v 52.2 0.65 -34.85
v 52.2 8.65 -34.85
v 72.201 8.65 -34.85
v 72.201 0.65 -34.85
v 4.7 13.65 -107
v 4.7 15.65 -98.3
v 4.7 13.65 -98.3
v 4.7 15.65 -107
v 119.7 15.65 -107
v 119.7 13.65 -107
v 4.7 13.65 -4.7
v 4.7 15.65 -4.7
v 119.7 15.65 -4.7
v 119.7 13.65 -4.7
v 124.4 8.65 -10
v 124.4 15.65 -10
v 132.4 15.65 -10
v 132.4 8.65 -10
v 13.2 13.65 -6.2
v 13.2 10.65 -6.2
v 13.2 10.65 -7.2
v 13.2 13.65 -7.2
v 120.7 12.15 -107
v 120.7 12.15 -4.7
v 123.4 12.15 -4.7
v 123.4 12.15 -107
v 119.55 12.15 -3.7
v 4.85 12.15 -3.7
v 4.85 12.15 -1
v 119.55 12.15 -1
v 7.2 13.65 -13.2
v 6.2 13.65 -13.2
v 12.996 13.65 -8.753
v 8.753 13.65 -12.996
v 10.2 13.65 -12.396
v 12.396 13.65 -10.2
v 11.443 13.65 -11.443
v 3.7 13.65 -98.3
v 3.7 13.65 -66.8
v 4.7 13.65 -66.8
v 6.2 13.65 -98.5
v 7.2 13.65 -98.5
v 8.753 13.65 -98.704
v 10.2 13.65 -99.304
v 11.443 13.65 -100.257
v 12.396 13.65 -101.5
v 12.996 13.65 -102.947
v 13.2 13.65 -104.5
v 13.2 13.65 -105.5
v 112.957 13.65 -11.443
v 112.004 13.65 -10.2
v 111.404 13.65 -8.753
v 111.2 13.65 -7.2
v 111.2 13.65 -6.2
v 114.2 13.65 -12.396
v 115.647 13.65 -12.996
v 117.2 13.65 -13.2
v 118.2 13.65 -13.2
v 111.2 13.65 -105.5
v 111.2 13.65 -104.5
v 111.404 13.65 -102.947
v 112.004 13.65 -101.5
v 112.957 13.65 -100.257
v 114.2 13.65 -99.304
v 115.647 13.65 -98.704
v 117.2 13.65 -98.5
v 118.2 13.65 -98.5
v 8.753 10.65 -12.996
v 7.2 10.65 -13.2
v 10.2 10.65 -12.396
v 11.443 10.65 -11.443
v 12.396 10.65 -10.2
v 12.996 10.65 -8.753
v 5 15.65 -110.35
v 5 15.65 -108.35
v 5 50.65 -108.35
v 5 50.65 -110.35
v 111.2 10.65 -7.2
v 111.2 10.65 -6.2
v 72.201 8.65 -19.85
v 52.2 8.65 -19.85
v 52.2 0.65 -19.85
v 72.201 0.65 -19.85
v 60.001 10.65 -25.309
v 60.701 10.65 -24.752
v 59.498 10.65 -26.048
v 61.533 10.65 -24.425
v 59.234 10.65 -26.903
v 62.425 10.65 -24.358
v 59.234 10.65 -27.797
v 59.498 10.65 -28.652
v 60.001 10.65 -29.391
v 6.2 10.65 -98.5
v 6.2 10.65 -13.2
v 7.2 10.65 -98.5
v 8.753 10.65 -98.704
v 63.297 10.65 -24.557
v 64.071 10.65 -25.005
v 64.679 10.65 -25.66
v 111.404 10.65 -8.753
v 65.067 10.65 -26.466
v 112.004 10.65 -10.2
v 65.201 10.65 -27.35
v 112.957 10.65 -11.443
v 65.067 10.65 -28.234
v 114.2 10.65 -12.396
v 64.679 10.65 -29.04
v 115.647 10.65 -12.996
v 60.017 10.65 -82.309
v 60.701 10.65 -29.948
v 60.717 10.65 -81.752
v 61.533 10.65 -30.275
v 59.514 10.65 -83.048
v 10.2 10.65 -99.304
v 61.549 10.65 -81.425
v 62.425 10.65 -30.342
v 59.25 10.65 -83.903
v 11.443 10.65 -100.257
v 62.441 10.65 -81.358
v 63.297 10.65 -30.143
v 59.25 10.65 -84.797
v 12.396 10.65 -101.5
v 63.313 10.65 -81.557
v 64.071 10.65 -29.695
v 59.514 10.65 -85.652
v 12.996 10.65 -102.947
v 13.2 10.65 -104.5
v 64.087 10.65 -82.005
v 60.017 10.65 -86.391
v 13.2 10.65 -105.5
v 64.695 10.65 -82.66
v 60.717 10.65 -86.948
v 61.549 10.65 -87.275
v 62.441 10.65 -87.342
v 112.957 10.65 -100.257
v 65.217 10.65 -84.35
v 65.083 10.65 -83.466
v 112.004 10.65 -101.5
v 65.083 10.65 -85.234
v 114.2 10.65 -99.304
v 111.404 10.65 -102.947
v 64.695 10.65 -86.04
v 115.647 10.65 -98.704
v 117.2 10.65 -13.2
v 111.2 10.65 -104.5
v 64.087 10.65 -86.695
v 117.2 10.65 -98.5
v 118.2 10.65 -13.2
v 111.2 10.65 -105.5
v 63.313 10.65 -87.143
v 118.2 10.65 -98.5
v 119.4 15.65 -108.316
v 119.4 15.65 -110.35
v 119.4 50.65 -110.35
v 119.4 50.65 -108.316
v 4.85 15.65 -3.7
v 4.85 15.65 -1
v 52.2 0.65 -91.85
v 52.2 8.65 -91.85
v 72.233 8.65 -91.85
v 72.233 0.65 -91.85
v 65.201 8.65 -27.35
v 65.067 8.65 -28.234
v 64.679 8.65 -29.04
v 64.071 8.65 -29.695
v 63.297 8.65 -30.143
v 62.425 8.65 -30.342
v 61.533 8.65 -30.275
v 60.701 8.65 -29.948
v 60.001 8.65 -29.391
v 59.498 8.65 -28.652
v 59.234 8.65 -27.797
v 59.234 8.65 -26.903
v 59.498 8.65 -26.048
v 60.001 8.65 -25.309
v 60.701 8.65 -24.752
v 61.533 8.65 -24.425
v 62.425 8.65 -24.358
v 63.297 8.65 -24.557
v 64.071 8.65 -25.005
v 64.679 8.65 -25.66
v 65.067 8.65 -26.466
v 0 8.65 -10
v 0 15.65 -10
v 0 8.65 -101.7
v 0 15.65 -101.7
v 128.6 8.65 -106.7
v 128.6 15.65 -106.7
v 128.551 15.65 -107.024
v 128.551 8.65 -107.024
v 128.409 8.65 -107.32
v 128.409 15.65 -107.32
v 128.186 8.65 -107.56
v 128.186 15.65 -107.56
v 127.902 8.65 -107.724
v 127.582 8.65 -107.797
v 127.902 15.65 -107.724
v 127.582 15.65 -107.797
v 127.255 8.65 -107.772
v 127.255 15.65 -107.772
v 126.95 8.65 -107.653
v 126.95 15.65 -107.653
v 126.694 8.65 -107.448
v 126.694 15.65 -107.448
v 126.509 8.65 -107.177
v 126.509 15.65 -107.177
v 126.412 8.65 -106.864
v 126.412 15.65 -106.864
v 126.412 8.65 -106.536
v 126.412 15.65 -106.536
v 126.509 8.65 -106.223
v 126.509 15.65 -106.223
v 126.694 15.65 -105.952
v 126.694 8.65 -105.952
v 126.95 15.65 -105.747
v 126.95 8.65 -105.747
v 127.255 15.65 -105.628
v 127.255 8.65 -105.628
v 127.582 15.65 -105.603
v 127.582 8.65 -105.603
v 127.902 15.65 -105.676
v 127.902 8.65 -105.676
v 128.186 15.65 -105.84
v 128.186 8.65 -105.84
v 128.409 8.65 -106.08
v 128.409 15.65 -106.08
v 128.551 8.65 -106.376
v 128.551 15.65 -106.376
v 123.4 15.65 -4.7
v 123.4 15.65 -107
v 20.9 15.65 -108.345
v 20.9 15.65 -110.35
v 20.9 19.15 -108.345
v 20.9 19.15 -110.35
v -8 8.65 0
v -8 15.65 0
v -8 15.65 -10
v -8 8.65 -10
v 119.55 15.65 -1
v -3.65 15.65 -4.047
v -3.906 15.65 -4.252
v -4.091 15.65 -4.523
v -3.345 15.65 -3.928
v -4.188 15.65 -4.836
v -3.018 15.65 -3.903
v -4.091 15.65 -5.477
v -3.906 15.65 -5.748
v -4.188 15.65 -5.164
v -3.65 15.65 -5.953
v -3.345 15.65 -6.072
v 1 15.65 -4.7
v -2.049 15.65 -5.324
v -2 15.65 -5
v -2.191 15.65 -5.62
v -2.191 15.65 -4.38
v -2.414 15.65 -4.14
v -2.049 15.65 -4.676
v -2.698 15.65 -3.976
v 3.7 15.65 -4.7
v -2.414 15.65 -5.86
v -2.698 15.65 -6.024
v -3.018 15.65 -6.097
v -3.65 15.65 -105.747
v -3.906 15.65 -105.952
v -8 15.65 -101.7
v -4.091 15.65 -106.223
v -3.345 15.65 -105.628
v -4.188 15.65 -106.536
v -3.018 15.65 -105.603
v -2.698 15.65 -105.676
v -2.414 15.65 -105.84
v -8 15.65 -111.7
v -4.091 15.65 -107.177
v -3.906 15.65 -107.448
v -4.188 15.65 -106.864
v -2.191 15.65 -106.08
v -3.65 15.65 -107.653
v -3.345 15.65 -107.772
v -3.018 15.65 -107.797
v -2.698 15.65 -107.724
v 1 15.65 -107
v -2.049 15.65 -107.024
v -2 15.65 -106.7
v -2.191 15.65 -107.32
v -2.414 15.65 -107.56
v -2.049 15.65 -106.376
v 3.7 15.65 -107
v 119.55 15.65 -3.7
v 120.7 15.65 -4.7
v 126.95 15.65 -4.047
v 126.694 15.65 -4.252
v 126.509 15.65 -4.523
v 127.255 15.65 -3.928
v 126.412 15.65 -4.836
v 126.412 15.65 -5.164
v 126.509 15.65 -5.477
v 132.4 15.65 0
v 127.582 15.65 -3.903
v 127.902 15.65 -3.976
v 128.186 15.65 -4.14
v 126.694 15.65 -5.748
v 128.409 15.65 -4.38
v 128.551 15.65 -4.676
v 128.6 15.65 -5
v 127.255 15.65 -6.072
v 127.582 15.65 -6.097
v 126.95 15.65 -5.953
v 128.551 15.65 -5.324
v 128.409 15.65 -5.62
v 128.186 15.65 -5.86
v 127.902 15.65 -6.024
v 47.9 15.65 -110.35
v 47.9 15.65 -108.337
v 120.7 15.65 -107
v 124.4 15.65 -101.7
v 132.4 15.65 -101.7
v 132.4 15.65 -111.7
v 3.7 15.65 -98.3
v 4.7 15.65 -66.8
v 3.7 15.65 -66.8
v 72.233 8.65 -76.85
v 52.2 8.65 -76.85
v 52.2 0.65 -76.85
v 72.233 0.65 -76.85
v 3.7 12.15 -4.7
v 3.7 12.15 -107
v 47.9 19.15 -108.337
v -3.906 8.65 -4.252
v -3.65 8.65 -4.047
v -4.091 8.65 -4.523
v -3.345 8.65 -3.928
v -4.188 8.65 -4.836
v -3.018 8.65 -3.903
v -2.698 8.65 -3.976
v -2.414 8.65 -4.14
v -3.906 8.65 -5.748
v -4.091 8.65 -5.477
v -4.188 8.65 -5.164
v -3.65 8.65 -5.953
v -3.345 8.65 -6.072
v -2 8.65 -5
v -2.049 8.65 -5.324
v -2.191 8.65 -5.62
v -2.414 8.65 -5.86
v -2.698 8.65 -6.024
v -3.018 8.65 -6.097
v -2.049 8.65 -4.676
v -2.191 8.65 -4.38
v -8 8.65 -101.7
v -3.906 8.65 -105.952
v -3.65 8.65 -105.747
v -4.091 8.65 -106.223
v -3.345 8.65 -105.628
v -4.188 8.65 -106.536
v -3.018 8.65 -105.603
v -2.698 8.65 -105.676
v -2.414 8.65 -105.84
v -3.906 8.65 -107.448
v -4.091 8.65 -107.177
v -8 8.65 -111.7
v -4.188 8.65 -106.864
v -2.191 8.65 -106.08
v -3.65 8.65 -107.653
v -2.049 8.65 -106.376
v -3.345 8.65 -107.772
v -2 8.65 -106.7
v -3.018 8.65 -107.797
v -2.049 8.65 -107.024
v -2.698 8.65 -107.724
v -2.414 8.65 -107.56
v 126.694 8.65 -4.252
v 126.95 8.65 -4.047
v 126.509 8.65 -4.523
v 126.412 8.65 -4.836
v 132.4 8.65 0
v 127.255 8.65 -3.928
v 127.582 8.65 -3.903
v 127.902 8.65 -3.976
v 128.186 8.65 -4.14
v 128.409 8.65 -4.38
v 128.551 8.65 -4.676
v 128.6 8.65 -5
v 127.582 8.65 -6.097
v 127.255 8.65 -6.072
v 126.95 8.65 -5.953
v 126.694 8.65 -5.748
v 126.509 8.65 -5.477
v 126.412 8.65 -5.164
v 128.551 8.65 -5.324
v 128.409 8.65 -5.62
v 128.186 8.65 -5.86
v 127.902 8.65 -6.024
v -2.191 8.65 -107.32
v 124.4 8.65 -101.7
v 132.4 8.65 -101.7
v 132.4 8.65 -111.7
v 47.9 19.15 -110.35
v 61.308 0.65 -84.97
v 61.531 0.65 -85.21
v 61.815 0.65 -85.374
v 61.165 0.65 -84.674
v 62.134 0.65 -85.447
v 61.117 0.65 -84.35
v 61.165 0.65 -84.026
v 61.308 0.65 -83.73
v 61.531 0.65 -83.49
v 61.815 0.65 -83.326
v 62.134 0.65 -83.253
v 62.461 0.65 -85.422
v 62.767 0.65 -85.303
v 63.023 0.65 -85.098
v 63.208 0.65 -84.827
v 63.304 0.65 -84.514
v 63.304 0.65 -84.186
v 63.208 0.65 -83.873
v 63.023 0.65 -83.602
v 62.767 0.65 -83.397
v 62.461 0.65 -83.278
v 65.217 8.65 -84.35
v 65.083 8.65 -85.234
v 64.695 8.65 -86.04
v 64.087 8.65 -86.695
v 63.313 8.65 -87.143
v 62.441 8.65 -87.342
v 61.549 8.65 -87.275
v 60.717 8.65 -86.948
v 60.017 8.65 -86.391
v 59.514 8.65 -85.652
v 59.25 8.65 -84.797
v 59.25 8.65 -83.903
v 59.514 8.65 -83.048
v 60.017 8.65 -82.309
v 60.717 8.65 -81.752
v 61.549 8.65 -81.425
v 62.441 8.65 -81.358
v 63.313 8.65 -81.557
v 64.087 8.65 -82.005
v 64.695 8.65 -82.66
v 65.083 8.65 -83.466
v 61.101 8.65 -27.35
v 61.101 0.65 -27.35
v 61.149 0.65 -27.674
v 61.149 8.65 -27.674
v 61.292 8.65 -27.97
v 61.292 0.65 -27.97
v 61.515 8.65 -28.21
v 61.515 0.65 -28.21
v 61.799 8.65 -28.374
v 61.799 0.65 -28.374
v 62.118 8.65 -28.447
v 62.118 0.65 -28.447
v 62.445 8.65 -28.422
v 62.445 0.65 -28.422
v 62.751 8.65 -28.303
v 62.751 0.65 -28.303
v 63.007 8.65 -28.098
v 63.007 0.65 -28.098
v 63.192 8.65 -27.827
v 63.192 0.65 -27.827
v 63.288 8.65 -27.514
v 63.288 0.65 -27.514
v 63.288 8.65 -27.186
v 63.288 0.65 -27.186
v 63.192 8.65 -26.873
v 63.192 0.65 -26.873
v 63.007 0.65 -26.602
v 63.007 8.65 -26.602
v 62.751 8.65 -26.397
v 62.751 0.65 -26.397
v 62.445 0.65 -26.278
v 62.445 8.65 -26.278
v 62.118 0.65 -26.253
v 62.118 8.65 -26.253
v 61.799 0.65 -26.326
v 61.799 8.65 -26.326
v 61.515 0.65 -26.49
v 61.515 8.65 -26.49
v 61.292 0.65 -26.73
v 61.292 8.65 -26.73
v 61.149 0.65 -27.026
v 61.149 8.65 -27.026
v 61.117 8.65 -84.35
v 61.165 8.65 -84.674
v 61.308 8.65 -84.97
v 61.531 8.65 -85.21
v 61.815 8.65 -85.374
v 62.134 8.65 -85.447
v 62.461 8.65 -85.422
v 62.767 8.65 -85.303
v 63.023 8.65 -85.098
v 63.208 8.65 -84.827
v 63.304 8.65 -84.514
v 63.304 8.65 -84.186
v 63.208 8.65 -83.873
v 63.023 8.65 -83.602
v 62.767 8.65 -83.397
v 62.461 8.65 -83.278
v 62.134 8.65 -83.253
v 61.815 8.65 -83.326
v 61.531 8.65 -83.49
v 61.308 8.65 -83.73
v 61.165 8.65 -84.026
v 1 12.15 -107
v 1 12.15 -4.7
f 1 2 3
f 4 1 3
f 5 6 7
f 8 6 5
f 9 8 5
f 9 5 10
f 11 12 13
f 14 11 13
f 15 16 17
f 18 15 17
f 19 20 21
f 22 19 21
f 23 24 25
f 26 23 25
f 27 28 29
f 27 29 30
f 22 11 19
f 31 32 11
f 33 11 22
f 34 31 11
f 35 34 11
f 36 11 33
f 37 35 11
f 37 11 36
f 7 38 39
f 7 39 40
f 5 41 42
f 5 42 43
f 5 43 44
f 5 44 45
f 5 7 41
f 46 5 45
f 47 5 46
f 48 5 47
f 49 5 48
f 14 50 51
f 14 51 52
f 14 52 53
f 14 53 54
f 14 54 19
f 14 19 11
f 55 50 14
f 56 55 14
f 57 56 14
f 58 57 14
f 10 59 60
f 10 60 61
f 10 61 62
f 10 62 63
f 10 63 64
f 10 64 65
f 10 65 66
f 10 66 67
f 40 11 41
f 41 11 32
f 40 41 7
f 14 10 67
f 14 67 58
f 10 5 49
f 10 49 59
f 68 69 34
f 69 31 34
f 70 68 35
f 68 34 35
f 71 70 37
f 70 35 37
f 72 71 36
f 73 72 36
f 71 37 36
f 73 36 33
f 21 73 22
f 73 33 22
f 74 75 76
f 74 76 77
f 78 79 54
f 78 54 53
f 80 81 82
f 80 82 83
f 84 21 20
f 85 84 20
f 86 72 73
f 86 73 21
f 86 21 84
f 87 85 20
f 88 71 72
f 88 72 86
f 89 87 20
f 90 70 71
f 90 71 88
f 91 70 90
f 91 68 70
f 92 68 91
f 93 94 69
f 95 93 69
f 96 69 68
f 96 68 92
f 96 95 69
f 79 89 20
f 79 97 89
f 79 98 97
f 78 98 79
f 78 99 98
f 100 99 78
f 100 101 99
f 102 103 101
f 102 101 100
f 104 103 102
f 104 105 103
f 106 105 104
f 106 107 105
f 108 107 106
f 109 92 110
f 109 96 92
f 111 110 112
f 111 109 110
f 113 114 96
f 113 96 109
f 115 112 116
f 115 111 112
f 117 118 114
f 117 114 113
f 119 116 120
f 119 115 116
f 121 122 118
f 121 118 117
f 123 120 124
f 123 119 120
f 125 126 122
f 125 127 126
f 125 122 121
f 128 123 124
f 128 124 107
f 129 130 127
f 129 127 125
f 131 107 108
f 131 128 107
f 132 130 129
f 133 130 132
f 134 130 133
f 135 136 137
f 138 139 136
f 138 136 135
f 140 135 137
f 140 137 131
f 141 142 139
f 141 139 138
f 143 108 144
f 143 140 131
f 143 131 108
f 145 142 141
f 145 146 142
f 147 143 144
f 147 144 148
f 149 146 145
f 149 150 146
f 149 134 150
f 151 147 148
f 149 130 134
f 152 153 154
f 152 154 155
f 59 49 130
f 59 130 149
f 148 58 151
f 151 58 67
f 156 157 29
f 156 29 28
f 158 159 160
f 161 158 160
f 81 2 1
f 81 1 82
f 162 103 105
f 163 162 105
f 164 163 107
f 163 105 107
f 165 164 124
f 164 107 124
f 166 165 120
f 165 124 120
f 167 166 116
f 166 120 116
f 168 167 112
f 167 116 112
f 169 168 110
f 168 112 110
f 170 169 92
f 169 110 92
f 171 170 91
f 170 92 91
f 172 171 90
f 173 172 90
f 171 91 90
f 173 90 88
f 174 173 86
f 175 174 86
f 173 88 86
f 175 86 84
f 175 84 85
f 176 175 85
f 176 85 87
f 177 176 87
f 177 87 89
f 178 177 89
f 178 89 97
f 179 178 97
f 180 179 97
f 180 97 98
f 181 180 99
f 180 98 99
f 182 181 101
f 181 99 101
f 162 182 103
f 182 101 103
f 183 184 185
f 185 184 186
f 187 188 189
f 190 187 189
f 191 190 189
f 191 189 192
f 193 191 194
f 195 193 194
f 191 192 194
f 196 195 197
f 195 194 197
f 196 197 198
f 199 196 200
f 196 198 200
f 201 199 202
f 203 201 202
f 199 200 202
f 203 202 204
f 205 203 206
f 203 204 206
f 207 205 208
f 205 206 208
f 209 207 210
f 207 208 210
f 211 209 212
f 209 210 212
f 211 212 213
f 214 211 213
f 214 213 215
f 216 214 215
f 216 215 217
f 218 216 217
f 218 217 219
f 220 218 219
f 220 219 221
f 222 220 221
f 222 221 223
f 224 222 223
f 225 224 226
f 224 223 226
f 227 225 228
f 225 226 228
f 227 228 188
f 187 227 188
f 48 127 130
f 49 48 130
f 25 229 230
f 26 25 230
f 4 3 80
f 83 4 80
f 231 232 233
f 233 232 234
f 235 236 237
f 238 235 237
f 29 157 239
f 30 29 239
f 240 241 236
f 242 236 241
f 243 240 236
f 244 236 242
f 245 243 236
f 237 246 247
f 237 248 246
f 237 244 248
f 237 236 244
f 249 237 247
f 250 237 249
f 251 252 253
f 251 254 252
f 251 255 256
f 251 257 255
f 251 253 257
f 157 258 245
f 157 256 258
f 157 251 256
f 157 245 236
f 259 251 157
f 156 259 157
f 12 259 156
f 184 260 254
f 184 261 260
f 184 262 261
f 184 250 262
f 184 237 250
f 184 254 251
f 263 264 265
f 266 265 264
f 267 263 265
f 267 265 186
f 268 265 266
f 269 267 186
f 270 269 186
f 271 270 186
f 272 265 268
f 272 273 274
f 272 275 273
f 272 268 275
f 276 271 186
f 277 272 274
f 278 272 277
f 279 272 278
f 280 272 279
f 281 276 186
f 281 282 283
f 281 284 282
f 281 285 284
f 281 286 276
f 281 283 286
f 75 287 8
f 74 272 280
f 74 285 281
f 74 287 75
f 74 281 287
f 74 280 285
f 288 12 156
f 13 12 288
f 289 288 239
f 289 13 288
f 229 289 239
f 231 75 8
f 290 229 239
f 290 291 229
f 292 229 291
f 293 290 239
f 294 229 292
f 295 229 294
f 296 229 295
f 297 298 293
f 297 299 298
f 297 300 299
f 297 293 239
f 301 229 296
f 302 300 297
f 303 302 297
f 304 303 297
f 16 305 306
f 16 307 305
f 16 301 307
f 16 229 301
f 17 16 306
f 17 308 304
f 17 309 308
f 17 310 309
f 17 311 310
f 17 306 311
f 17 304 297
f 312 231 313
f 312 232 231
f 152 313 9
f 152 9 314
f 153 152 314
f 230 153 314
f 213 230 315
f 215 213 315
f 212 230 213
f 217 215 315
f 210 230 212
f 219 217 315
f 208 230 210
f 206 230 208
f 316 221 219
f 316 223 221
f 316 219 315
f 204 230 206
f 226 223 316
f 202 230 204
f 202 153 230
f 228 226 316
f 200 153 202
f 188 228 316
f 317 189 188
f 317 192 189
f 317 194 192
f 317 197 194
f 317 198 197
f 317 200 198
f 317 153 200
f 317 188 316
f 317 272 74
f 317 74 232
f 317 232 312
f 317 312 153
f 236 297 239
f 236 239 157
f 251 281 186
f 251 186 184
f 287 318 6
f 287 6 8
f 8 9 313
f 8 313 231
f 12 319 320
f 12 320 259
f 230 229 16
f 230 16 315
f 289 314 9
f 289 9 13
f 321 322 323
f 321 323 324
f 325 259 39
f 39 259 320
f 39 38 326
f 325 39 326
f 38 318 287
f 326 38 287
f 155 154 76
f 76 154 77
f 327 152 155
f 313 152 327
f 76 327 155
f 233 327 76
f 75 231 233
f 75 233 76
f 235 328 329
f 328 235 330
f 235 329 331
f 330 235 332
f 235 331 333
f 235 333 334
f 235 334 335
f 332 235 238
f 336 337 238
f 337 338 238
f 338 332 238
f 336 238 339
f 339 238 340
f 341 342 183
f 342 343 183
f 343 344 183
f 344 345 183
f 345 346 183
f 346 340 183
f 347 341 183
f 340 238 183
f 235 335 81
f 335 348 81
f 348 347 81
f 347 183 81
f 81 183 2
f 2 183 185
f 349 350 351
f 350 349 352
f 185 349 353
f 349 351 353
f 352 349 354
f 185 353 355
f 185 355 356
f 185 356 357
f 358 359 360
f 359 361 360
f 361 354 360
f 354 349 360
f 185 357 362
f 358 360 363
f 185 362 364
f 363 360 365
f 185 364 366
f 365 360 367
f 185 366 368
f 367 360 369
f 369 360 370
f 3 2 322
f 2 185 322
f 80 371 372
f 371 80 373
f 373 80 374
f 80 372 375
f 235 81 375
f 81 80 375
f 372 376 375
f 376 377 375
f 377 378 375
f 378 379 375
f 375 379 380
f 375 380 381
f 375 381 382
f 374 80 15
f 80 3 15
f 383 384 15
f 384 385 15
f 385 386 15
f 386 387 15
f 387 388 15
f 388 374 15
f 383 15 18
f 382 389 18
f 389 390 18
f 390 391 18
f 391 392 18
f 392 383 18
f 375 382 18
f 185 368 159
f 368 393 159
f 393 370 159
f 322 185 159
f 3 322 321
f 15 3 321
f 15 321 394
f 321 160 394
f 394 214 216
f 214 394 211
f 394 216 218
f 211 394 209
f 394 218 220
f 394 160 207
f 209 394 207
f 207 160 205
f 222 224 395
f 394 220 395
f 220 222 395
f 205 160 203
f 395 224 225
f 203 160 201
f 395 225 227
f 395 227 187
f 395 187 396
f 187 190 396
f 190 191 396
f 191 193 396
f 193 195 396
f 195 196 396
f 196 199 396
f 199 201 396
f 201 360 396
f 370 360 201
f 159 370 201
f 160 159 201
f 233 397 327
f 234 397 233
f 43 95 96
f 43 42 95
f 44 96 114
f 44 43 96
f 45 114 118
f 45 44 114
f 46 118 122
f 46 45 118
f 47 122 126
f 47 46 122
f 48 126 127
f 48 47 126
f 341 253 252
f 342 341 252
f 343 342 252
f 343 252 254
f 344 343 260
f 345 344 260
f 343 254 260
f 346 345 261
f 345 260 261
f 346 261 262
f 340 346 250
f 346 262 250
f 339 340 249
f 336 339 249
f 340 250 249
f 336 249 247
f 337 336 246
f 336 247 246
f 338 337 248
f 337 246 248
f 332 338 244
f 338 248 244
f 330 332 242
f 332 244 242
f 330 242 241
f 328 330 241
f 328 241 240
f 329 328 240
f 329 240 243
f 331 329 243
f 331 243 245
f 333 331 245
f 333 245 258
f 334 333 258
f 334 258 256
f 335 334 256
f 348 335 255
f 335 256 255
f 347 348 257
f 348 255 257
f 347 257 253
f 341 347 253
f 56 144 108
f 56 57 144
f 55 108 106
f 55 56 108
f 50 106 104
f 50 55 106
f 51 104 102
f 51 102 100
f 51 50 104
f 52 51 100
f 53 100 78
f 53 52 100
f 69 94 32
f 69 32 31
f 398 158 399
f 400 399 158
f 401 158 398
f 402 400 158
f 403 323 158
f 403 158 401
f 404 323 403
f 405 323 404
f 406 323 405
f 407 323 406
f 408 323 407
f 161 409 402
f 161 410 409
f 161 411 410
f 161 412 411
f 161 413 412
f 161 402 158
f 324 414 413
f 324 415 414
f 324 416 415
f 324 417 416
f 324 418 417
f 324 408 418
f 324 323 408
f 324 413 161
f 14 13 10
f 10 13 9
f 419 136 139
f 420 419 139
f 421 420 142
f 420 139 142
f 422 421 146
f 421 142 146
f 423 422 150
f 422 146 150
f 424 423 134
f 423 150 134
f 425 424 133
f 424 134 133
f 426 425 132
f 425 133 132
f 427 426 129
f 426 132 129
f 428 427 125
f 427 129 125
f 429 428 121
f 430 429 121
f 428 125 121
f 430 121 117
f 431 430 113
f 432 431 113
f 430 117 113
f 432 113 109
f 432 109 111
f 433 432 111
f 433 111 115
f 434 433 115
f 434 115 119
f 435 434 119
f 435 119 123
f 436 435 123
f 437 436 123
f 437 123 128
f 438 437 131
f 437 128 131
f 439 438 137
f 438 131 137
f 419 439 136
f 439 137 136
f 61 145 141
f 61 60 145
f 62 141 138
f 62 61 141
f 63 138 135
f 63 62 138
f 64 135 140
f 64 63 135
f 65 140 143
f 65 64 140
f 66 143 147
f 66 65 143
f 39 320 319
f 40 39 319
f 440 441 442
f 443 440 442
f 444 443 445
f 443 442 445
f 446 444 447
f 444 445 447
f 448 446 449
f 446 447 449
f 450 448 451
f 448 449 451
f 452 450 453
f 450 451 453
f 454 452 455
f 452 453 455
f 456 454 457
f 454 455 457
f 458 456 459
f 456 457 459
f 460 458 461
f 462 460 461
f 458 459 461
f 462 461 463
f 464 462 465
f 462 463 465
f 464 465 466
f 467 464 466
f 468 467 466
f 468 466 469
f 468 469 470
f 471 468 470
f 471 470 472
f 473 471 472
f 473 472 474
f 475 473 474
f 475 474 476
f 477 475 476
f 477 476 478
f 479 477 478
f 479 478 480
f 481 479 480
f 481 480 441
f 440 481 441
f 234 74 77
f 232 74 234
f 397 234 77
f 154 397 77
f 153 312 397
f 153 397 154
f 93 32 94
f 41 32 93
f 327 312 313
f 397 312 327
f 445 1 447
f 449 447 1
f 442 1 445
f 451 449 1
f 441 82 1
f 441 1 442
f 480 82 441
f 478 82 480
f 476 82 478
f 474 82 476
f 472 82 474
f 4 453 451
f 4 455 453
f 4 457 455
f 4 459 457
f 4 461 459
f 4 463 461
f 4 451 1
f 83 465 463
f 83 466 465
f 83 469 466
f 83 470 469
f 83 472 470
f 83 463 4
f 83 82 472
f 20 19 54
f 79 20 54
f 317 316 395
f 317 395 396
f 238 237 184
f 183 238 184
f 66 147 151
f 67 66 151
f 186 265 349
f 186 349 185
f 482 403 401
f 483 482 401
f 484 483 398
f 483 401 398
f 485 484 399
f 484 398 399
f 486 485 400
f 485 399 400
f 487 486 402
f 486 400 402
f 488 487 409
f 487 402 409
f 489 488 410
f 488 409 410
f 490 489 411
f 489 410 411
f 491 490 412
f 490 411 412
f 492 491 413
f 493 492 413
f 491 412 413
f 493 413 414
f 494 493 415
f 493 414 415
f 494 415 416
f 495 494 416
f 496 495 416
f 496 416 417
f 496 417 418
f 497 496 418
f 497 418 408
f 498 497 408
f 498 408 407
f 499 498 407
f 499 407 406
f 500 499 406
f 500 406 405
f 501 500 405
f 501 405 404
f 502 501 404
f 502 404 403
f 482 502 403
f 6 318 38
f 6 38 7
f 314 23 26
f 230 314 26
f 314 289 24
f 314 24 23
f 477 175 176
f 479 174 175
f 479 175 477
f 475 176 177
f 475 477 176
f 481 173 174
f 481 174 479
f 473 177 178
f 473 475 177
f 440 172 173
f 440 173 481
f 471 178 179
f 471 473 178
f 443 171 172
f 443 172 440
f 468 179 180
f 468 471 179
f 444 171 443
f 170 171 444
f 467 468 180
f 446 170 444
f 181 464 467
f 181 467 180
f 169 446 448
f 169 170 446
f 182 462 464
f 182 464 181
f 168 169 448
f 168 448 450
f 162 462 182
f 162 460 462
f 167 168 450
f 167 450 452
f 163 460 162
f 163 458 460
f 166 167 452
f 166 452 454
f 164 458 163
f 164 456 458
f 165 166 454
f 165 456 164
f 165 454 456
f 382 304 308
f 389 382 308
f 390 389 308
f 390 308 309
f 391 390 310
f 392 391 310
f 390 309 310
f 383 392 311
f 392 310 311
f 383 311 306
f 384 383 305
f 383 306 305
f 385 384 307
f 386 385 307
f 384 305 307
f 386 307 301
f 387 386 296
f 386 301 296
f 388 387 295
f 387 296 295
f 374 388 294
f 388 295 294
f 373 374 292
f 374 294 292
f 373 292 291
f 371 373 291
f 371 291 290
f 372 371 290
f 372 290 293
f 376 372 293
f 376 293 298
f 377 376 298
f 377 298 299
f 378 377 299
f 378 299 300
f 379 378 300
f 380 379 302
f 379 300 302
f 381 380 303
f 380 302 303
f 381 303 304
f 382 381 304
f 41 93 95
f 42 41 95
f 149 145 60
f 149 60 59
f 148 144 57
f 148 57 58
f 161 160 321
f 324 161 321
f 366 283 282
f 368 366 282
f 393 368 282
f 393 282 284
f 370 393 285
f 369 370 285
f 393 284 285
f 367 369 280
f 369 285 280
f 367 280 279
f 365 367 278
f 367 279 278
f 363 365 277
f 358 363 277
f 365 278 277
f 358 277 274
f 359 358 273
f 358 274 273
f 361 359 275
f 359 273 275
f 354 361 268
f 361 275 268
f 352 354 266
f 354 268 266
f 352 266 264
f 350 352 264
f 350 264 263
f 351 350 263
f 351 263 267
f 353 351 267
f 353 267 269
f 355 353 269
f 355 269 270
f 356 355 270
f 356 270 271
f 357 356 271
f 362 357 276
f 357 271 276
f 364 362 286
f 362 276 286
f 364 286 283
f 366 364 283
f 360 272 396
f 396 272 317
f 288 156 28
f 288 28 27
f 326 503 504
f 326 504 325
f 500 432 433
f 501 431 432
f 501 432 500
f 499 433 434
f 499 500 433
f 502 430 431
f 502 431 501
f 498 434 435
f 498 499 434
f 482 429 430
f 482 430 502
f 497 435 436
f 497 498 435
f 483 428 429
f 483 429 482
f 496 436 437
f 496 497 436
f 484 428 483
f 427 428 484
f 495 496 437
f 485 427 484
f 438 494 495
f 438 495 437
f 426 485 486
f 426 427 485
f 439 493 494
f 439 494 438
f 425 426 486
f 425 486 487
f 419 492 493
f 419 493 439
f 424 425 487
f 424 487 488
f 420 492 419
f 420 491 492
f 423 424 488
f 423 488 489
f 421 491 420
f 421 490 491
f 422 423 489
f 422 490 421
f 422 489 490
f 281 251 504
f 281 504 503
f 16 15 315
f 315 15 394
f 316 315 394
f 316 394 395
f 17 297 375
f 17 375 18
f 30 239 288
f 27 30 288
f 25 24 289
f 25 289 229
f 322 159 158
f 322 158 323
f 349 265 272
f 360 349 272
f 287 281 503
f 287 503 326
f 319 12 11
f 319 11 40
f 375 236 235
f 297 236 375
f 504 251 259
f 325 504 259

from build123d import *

# Parameters (mm, degrees)
SKETCH1_W            = 124.4
SKETCH1_H            = 111.7
BOSS_EXTRUDE1_DEPTH  = 15.65
FILLET1_R            = 2
SKETCH4_W            = 115
SKETCH4_H            = 102.3
CUT_EXTRUDE1_DEPTH   = 2
SKETCH5_W            = 112
SKETCH5_H            = 99.3
CUT_EXTRUDE2_DEPTH   = 3
SKETCH10_W           = 7
SKETCH10_H           = 7
BOSS_EXTRUDE2_DEPTH  = 3
BOSS_EXTRUDE5_DEPTH  = 35
FILLET3_R            = 6
SKETCH32_W           = 114.7
SKETCH32_H           = 2.7
SKETCH32_W_2         = 2.7
SKETCH32_H_2         = 102.3
CUT_EXTRUDE7_DEPTH   = 3.5
SKETCH29_W           = 27
SKETCH29_H           = 3.5
CUT_EXTRUDE8_DEPTH   = 112.7
SKETCH34_W           = 1
SKETCH34_H           = 31.5
CUT_EXTRUDE9_DEPTH   = 2
SKETCH39_W           = 124.4
SKETCH39_H           = 111.7
CUT_EXTRUDE14_DEPTH  = 8.65
SKETCH40_W           = 10.736913624
SKETCH40_H           = 4.7
BOSS_EXTRUDE8_DEPTH  = 7
SKETCH42_W           = 6.036913624
SKETCH42_H           = 2.116828075
BOSS_EXTRUDE9_DEPTH  = 7
SKETCH43_W           = 2
SKETCH43_H           = 3.979386742
BOSS_EXTRUDE10_DEPTH = 7
SKETCH44_W           = 10.013933806
SKETCH44_H           = 10.028001726
BOSS_EXTRUDE11_DEPTH = 7
SKETCH45_R           = 1.1
CUT_EXTRUDE15_DEPTH  = 8
SKETCH46_W           = 2
SKETCH46_H           = 2
BOSS_EXTRUDE12_DEPTH = 7
SKETCH47_W           = 2
SKETCH47_H           = 2
BOSS_EXTRUDE13_DEPTH = 7
SKETCH48_W           = 10
SKETCH48_H           = 10
BOSS_EXTRUDE14_DEPTH = 7
SKETCH49_R           = 1.1
SKETCH49_W           = 6.036913624
SKETCH49_H           = 6.816828075
CUT_EXTRUDE18_DEPTH  = 7
SKETCH50_W           = 8
SKETCH50_H           = 10
BOSS_EXTRUDE17_DEPTH = 7
SKETCH51_W           = 5.24842793
SKETCH51_H           = 4.514776714
BOSS_EXTRUDE18_DEPTH = 7
SKETCH52_W           = 2
SKETCH52_H           = 10
CUT_EXTRUDE19_DEPTH  = 7
SKETCH53_W           = 10.013933806
SKETCH53_H           = 10.028001726
CUT_EXTRUDE20_DEPTH  = 7
SKETCH54_W           = 8
SKETCH54_H           = 10
BOSS_EXTRUDE19_DEPTH = 7
SKETCH55_W           = 8
SKETCH55_H           = 10
BOSS_EXTRUDE20_DEPTH = 7
SKETCH56_R           = 1.1
CUT_EXTRUDE21_DEPTH  = 7
SKETCH57_R           = 1.1
CUT_EXTRUDE22_DEPTH  = 7
SKETCH58_R           = 1.1
CUT_EXTRUDE23_DEPTH  = 7
SKETCH59_R           = 1.1
CUT_EXTRUDE24_DEPTH  = 7
SKETCH61_W           = 20.033048375
SKETCH61_H           = 15
SKETCH61_W_2         = 20.00121795
BOSS_EXTRUDE22_DEPTH = 8
SKETCH64_R           = 1.1
CUT_EXTRUDE27_DEPTH  = 51
SKETCH65_R           = 3
CUT_EXTRUDE28_DEPTH  = 2


with BuildPart() as part:
    # Sketch1 → Boss-Extrude1 (new body)
    with BuildSketch(Plane(origin=(0, 0, 0), x_dir=(1, 0, 0), z_dir=(0, 1, 0))):
        with Locations((62.2, 55.85)):
            Rectangle(SKETCH1_W, SKETCH1_H)
    extrude(amount=BOSS_EXTRUDE1_DEPTH)

    # Fillet1
    fillet1_edges = [part.edges().sort_by_distance(p)[0] for p in [
        (0, 7.825, -111.7),
        (124.4, 7.825, -111.7),
        (124.4, 7.825, 0),
        (0, 7.825, 0),
    ]]
    fillet(fillet1_edges, radius=FILLET1_R)

    # Sketch4 → Cut-Extrude1 (cut)
    with BuildSketch(Plane(origin=(0, 15.65, 0), x_dir=(1, 0, 0), z_dir=(0, 1, 0))):
        with Locations((62.2, 55.85)):
            Rectangle(SKETCH4_W, SKETCH4_H)
    extrude(amount=-CUT_EXTRUDE1_DEPTH, mode=Mode.SUBTRACT)

    # Sketch5 → Cut-Extrude2 (cut)
    with BuildSketch(Plane(origin=(0, 13.65, 0), x_dir=(1, 0, 0), z_dir=(0, 1, 0))):
        with Locations((62.2, 55.85)):
            Rectangle(SKETCH5_W, SKETCH5_H)
    extrude(amount=-CUT_EXTRUDE2_DEPTH, mode=Mode.SUBTRACT)

    # Sketch10 → Boss-Extrude2 (add)
    with BuildSketch(Plane(origin=(0, 10.65, 0), x_dir=(1, 0, 0), z_dir=(0, 1, 0))):
        with Locations((9.7, 102)):
            Rectangle(SKETCH10_W, SKETCH10_H)
        with Locations((9.7, 9.7)):
            Rectangle(SKETCH10_W, SKETCH10_H)
        with Locations((114.7, 102)):
            Rectangle(SKETCH10_W, SKETCH10_H)
        with Locations((114.7, 9.7)):
            Rectangle(SKETCH10_W, SKETCH10_H)
    extrude(amount=BOSS_EXTRUDE2_DEPTH)

    # Sketch27 → Boss-Extrude5 (add)
    with BuildSketch(Plane(origin=(0, 15.65, 0), x_dir=(1, 0, 0), z_dir=(0, 1, 0))):
        Polygon((5, 110.35), (119.4, 110.35), (119.4, 108.316244658), (5, 108.35), align=None)
    extrude(amount=BOSS_EXTRUDE5_DEPTH)

    # Fillet3
    fillet3_edges = [part.edges().sort_by_distance(p)[0] for p in [
        (111.2, 12.15, -13.2),
        (13.2, 12.15, -98.5),
        (13.2, 12.15, -13.2),
        (111.2, 12.15, -98.5),
    ]]
    fillet(fillet3_edges, radius=FILLET3_R)

    # Sketch32 → Cut-Extrude7 (cut)
    with BuildSketch(Plane(origin=(0, 15.65, 0), x_dir=(1, 0, 0), z_dir=(0, 1, 0))):
        with Locations((62.2, 2.35)):
            Rectangle(SKETCH32_W, SKETCH32_H)
        with Locations((2.35, 55.85)):
            Rectangle(SKETCH32_W_2, SKETCH32_H_2)
        with Locations((122.05, 55.85)):
            Rectangle(SKETCH32_W_2, SKETCH32_H_2)
    extrude(amount=-CUT_EXTRUDE7_DEPTH, mode=Mode.SUBTRACT)

    # Sketch29 → Cut-Extrude8 (cut, through all)
    with BuildSketch(Plane(origin=(0, 0, -111.7), x_dir=(-1, 0, 0), z_dir=(0, 0, -1))):
        with Locations((-34.4, 17.4)):
            Rectangle(SKETCH29_W, SKETCH29_H)
    extrude(amount=-CUT_EXTRUDE8_DEPTH, mode=Mode.SUBTRACT)

    # Sketch34 → Cut-Extrude9 (cut)
    with BuildSketch(Plane(origin=(0, 15.65, 0), x_dir=(1, 0, 0), z_dir=(0, 1, 0))):
        with Locations((4.2, 82.55)):
            Rectangle(SKETCH34_W, SKETCH34_H)
    extrude(amount=-CUT_EXTRUDE9_DEPTH, mode=Mode.SUBTRACT)

    # Sketch39 → Cut-Extrude14 (cut)
    with BuildSketch(Plane(origin=(0, 0, 0), x_dir=(-1, 0, 0), z_dir=(0, -1, 0))):
        with Locations((-62.2, 55.85)):
            Rectangle(SKETCH39_W, SKETCH39_H)
    extrude(amount=-CUT_EXTRUDE14_DEPTH, mode=Mode.SUBTRACT)

    # Sketch40 → Boss-Extrude8 (add)
    with BuildSketch(Plane(origin=(0, 15.65, 0), x_dir=(1, 0, 0), z_dir=(0, 1, 0))):
        with Locations((-0.668456812, 2.35)):
            Rectangle(SKETCH40_W, SKETCH40_H)
    extrude(amount=-BOSS_EXTRUDE8_DEPTH)

    # Sketch42 → Boss-Extrude9 (add)
    with BuildSketch(Plane(origin=(0, 15.65, 0), x_dir=(1, 0, 0), z_dir=(0, 1, 0))):
        with Locations((-3.018456812, 5.758414037)):
            Rectangle(SKETCH42_W, SKETCH42_H)
    extrude(amount=-BOSS_EXTRUDE9_DEPTH)

    # Sketch43 → Boss-Extrude10 (add)
    with BuildSketch(Plane(origin=(0, 15.65, 0), x_dir=(1, 0, 0), z_dir=(0, 1, 0))):
        with Locations((123.4, 1.989693371)):
            Rectangle(SKETCH43_W, SKETCH43_H)
    extrude(amount=-BOSS_EXTRUDE10_DEPTH)

    # Sketch44 → Boss-Extrude11 (add)
    with BuildSketch(Plane(origin=(0, 15.65, 0), x_dir=(1, 0, 0), z_dir=(0, 1, 0))):
        with Locations((129.406966903, 5.014000863)):
            Rectangle(SKETCH44_W, SKETCH44_H)
    extrude(amount=-BOSS_EXTRUDE11_DEPTH)

    # Sketch45 → Cut-Extrude15 (cut, through all)
    with BuildSketch(Plane(origin=(0, 15.65, 0), x_dir=(1, 0, 0), z_dir=(0, 1, 0))):
        with Locations((129.4, 5)):
            Circle(SKETCH45_R)
    extrude(amount=-CUT_EXTRUDE15_DEPTH, mode=Mode.SUBTRACT)

    # Sketch46 → Boss-Extrude12 (add)
    with BuildSketch(Plane(origin=(0, 15.65, 0), x_dir=(1, 0, 0), z_dir=(0, 1, 0))):
        with Locations((123.4, 110.7)):
            Rectangle(SKETCH46_W, SKETCH46_H)
    extrude(amount=-BOSS_EXTRUDE12_DEPTH)

    # Sketch47 → Boss-Extrude13 (add)
    with BuildSketch(Plane(origin=(0, 15.65, 0), x_dir=(1, 0, 0), z_dir=(0, 1, 0))):
        with Locations((1, 110.7)):
            Rectangle(SKETCH47_W, SKETCH47_H)
    extrude(amount=-BOSS_EXTRUDE13_DEPTH)

    # Sketch48 → Boss-Extrude14 (add)
    with BuildSketch(Plane(origin=(0, 15.65, 0), x_dir=(1, 0, 0), z_dir=(0, 1, 0))):
        with Locations((-5, 106.7)):
            Rectangle(SKETCH48_W, SKETCH48_H)
    extrude(amount=-BOSS_EXTRUDE14_DEPTH)

    # Sketch49 → Cut-Extrude18 (cut)
    with BuildSketch(Plane(origin=(0, 15.65, 0), x_dir=(1, 0, 0), z_dir=(0, 1, 0))):
        with Locations((-5, 106.7)):
            Circle(SKETCH49_R)
        with Locations((-3.018456812, 3.408414038)):
            Rectangle(SKETCH49_W, SKETCH49_H)
    extrude(amount=-CUT_EXTRUDE18_DEPTH, mode=Mode.SUBTRACT)

    # Sketch50 → Boss-Extrude17 (add)
    with BuildSketch(Plane(origin=(0, 15.65, 0), x_dir=(1, 0, 0), z_dir=(0, 1, 0))):
        with Locations((-4, 5)):
            Rectangle(SKETCH50_W, SKETCH50_H)
    extrude(amount=-BOSS_EXTRUDE17_DEPTH)

    # Sketch51 → Boss-Extrude18 (add)
    with BuildSketch(Plane(origin=(0, 15.65, 0), x_dir=(1, 0, 0), z_dir=(0, 1, 0))):
        with Locations((-4.818404413, 107.053945145)):
            Rectangle(SKETCH51_W, SKETCH51_H)
    extrude(amount=-BOSS_EXTRUDE18_DEPTH)

    # Sketch52 → Cut-Extrude19 (cut)
    with BuildSketch(Plane(origin=(0, 15.65, 0), x_dir=(1, 0, 0), z_dir=(0, 1, 0))):
        with Locations((-9, 106.7)):
            Rectangle(SKETCH52_W, SKETCH52_H)
    extrude(amount=-CUT_EXTRUDE19_DEPTH, mode=Mode.SUBTRACT)

    # Sketch53 → Cut-Extrude20 (cut)
    with BuildSketch(Plane(origin=(0, 15.65, 0), x_dir=(1, 0, 0), z_dir=(0, 1, 0))):
        with Locations((129.406966903, 5.014000863)):
            Rectangle(SKETCH53_W, SKETCH53_H)
    extrude(amount=-CUT_EXTRUDE20_DEPTH, mode=Mode.SUBTRACT)

    # Sketch54 → Boss-Extrude19 (add)
    with BuildSketch(Plane(origin=(0, 15.65, 0), x_dir=(1, 0, 0), z_dir=(0, 1, 0))):
        with Locations((128.4, 5)):
            Rectangle(SKETCH54_W, SKETCH54_H)
    extrude(amount=-BOSS_EXTRUDE19_DEPTH)

    # Sketch55 → Boss-Extrude20 (add)
    with BuildSketch(Plane(origin=(0, 15.65, 0), x_dir=(1, 0, 0), z_dir=(0, 1, 0))):
        with Locations((128.4, 106.7)):
            Rectangle(SKETCH55_W, SKETCH55_H)
    extrude(amount=-BOSS_EXTRUDE20_DEPTH)

    # Sketch56 → Cut-Extrude21 (cut)
    with BuildSketch(Plane(origin=(0, 15.65, 0), x_dir=(1, 0, 0), z_dir=(0, 1, 0))):
        with Locations((-3.1, 106.7)):
            Circle(SKETCH56_R)
    extrude(amount=-CUT_EXTRUDE21_DEPTH, mode=Mode.SUBTRACT)

    # Sketch57 → Cut-Extrude22 (cut)
    with BuildSketch(Plane(origin=(0, 15.65, 0), x_dir=(1, 0, 0), z_dir=(0, 1, 0))):
        with Locations((-3.1, 5)):
            Circle(SKETCH57_R)
    extrude(amount=-CUT_EXTRUDE22_DEPTH, mode=Mode.SUBTRACT)

    # Sketch58 → Cut-Extrude23 (cut)
    with BuildSketch(Plane(origin=(0, 15.65, 0), x_dir=(1, 0, 0), z_dir=(0, 1, 0))):
        with Locations((127.5, 5)):
            Circle(SKETCH58_R)
    extrude(amount=-CUT_EXTRUDE23_DEPTH, mode=Mode.SUBTRACT)

    # Sketch59 → Cut-Extrude24 (cut)
    with BuildSketch(Plane(origin=(0, 15.65, 0), x_dir=(1, 0, 0), z_dir=(0, 1, 0))):
        with Locations((127.5, 106.7)):
            Circle(SKETCH59_R)
    extrude(amount=-CUT_EXTRUDE24_DEPTH, mode=Mode.SUBTRACT)

    # Sketch61 → Boss-Extrude22 (add)
    with BuildSketch(Plane.XZ.offset(-8.65)):
        with Locations((62.216524188, -84.35)):
            Rectangle(SKETCH61_W, SKETCH61_H)
        with Locations((62.200608975, -27.35)):
            Rectangle(SKETCH61_W_2, SKETCH61_H)
    extrude(amount=BOSS_EXTRUDE22_DEPTH)

    # Sketch64 → Cut-Extrude27 (cut, through all)
    with BuildSketch(Plane(origin=(0, 0.65, 0), x_dir=(-1, 0, 0), z_dir=(0, -1, 0))):
        with Locations((-62.216524187, 84.35)):
            Circle(SKETCH64_R)
        with Locations((-62.200608975, 27.35)):
            Circle(SKETCH64_R)
    extrude(amount=-CUT_EXTRUDE27_DEPTH, mode=Mode.SUBTRACT)

    # Sketch65 → Cut-Extrude28 (cut)
    with BuildSketch(Plane(origin=(0, 10.65, 0), x_dir=(1, 0, 0), z_dir=(0, 1, 0))):
        with Locations((62.200608975, 27.35)):
            Circle(SKETCH65_R)
        with Locations((62.216524187, 84.35)):
            Circle(SKETCH65_R)
    extrude(amount=-CUT_EXTRUDE28_DEPTH, mode=Mode.SUBTRACT)


solid = part.part
